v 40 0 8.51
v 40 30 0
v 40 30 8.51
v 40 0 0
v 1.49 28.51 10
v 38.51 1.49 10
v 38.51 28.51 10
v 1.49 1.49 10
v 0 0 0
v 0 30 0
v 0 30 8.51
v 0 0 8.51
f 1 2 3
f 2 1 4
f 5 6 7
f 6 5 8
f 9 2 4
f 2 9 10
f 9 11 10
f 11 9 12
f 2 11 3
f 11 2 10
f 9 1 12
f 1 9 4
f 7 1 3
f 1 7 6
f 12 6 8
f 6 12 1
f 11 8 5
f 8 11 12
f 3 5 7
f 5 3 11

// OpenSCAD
// units=mm — generated by scad_emitter.py
// part=unnamed
$fn = 48;

intersection() { cube([40, 30, 10]); hull() { translate([0, 0, 0]) linear_extrude(height=0.01) offset(r=0) square([40, 30]); translate([1.5, 1.5, 10]) linear_extrude(height=0.01) offset(r=0) square([37, 27]); translate([0, 0, 8.5]) linear_extrude(height=0.01) offset(r=0) square([40, 30]); } }
